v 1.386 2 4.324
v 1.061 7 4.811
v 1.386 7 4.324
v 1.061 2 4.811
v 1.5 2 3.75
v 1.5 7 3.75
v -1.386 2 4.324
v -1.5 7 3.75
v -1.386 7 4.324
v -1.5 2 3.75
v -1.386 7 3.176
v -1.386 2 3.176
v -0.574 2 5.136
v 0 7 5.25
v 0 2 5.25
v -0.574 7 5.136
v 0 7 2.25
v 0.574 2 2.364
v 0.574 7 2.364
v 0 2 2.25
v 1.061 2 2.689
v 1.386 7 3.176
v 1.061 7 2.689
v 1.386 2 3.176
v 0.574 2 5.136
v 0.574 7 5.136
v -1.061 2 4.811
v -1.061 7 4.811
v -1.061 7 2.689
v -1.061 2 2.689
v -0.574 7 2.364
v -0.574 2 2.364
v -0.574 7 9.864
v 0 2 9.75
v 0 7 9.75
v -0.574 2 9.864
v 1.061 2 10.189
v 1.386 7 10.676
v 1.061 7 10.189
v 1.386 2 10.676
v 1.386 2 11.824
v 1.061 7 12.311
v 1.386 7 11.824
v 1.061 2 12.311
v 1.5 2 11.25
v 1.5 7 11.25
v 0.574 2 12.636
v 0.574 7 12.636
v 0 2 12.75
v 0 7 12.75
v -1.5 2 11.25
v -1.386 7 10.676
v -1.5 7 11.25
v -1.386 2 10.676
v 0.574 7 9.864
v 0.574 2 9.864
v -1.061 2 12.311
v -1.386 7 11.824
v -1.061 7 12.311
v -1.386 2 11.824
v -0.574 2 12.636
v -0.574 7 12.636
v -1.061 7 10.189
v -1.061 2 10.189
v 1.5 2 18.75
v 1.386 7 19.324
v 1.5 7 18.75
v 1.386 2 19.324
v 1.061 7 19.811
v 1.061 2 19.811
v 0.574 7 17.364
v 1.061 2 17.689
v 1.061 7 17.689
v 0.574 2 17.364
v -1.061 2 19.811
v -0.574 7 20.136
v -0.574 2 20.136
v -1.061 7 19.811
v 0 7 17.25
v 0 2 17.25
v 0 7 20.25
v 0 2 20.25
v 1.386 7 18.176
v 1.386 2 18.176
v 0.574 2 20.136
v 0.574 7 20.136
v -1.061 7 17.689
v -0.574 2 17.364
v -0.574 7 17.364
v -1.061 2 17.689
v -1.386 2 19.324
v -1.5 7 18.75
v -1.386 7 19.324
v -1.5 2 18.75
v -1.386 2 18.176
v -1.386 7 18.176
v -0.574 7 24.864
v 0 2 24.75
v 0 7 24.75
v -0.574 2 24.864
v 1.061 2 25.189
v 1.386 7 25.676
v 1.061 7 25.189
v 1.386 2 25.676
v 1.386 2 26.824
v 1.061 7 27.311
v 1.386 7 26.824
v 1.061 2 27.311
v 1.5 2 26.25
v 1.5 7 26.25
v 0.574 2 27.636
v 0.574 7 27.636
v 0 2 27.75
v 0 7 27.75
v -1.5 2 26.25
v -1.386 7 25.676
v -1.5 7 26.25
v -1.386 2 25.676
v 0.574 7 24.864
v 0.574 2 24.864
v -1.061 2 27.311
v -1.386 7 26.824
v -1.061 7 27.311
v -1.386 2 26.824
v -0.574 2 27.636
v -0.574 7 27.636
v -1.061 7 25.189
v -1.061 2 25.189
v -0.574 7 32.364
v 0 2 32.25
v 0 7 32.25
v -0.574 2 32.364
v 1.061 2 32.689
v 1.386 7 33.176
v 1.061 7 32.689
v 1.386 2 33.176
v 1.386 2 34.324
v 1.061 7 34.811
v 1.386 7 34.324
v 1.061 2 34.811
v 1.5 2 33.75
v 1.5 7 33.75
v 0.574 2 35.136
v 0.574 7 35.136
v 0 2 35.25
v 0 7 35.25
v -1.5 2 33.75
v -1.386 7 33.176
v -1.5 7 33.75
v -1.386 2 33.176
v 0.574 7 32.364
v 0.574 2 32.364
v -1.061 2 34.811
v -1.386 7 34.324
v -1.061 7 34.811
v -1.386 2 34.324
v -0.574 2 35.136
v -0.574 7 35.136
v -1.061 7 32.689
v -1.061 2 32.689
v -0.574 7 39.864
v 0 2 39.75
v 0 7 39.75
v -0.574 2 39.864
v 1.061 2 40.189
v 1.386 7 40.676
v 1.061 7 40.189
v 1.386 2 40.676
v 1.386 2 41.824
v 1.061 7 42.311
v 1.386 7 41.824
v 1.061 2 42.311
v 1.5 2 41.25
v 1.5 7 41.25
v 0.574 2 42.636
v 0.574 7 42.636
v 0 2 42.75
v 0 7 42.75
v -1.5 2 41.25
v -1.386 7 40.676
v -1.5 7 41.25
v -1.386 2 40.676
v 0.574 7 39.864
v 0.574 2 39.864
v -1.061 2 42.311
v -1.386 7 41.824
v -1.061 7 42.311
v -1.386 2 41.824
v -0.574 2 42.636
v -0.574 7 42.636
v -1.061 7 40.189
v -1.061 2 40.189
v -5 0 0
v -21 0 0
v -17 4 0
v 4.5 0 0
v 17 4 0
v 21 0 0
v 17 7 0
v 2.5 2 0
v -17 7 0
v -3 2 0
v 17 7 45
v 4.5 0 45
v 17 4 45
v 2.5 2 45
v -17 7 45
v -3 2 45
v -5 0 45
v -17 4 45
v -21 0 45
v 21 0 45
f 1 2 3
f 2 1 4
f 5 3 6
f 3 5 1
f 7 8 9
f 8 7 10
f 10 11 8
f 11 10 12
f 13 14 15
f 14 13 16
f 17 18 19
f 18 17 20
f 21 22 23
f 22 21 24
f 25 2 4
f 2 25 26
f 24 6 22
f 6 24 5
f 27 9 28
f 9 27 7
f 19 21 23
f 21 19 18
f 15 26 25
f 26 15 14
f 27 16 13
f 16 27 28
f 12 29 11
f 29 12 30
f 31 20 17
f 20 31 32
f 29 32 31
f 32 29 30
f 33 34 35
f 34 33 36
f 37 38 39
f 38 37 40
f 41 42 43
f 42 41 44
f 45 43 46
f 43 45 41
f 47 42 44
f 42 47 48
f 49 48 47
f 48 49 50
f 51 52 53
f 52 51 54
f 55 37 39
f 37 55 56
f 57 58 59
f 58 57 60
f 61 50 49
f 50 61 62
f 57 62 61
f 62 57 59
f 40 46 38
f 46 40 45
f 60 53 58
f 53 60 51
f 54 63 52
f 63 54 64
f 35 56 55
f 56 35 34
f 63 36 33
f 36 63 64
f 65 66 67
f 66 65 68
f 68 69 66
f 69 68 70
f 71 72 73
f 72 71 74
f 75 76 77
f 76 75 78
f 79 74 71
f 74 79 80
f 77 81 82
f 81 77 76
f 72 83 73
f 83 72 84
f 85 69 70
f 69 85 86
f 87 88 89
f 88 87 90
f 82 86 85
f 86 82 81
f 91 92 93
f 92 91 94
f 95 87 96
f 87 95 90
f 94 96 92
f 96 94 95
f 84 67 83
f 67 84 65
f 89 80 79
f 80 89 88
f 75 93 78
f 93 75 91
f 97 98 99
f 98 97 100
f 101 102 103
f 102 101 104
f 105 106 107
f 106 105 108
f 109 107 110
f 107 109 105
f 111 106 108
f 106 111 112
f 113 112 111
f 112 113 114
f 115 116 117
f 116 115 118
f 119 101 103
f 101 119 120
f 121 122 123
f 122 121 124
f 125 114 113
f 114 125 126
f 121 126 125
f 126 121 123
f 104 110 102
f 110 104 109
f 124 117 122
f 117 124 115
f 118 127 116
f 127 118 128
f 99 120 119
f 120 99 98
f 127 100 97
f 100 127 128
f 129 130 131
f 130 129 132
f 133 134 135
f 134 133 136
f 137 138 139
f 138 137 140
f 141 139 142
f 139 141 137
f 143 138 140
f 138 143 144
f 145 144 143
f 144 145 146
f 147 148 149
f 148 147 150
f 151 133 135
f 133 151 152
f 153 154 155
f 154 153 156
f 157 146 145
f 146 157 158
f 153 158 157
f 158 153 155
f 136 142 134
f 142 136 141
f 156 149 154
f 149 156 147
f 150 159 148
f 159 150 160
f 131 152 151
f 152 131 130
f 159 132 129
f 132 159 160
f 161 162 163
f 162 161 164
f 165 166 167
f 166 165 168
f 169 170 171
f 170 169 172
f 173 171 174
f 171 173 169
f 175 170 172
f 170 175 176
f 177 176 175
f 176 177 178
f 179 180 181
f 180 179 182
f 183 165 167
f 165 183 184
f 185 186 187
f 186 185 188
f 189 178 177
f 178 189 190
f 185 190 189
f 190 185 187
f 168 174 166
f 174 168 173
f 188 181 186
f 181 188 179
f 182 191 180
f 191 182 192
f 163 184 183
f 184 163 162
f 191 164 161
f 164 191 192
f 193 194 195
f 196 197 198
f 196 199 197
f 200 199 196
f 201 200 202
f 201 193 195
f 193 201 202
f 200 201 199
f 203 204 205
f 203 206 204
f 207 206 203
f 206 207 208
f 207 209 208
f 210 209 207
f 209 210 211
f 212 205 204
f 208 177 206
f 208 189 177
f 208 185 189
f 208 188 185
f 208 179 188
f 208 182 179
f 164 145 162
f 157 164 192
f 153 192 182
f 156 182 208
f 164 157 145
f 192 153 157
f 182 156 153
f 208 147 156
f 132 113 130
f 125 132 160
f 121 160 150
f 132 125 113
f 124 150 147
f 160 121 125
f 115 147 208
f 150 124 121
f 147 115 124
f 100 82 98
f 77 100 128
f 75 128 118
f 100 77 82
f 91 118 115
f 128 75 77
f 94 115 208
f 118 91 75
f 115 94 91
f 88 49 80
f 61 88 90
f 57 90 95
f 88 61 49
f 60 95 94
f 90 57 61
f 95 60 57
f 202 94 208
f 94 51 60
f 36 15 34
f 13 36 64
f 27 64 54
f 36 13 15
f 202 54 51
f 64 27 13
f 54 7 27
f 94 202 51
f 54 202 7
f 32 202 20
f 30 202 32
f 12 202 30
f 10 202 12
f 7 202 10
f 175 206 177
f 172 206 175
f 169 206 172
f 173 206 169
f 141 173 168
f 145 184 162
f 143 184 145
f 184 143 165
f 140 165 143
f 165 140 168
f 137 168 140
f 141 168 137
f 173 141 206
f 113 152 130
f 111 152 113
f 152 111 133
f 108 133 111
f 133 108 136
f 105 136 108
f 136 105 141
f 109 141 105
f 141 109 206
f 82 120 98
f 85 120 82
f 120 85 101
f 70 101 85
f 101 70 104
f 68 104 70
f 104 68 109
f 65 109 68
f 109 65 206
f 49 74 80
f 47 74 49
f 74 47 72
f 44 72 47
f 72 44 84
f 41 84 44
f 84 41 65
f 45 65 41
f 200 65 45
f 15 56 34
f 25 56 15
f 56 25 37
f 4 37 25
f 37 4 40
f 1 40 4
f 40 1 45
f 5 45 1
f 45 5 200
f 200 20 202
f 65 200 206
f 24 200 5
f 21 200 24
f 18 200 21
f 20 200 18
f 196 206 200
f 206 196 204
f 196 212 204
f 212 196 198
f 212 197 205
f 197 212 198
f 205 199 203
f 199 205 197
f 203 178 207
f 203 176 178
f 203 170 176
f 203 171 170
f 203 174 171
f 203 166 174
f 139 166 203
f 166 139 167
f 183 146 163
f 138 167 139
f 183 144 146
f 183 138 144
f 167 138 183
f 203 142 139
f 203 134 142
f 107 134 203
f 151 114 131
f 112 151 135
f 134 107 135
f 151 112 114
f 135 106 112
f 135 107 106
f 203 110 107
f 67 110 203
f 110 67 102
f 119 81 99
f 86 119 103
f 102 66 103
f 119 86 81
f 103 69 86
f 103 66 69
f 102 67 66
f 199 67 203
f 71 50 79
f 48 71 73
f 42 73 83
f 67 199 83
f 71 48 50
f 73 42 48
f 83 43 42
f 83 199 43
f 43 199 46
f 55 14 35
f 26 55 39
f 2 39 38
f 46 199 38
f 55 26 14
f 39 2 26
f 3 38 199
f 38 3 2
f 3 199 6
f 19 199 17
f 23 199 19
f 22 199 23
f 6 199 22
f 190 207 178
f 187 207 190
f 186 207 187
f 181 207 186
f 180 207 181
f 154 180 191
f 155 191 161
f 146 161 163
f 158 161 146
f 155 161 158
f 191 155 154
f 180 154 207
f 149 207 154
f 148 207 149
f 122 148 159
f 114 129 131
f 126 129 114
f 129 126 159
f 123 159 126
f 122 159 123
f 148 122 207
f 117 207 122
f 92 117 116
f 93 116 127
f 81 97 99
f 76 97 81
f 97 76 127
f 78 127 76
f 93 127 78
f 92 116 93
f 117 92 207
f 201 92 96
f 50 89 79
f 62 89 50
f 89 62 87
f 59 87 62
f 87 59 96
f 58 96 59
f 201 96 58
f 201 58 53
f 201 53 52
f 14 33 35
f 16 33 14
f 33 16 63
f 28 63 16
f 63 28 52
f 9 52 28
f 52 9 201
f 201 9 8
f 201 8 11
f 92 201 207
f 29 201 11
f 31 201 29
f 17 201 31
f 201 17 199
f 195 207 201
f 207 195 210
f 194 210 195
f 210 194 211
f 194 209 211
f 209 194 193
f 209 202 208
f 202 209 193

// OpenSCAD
use <../nscad-lib.scad>

color("orange") arca_plate(top_height = 3, length = 45);
